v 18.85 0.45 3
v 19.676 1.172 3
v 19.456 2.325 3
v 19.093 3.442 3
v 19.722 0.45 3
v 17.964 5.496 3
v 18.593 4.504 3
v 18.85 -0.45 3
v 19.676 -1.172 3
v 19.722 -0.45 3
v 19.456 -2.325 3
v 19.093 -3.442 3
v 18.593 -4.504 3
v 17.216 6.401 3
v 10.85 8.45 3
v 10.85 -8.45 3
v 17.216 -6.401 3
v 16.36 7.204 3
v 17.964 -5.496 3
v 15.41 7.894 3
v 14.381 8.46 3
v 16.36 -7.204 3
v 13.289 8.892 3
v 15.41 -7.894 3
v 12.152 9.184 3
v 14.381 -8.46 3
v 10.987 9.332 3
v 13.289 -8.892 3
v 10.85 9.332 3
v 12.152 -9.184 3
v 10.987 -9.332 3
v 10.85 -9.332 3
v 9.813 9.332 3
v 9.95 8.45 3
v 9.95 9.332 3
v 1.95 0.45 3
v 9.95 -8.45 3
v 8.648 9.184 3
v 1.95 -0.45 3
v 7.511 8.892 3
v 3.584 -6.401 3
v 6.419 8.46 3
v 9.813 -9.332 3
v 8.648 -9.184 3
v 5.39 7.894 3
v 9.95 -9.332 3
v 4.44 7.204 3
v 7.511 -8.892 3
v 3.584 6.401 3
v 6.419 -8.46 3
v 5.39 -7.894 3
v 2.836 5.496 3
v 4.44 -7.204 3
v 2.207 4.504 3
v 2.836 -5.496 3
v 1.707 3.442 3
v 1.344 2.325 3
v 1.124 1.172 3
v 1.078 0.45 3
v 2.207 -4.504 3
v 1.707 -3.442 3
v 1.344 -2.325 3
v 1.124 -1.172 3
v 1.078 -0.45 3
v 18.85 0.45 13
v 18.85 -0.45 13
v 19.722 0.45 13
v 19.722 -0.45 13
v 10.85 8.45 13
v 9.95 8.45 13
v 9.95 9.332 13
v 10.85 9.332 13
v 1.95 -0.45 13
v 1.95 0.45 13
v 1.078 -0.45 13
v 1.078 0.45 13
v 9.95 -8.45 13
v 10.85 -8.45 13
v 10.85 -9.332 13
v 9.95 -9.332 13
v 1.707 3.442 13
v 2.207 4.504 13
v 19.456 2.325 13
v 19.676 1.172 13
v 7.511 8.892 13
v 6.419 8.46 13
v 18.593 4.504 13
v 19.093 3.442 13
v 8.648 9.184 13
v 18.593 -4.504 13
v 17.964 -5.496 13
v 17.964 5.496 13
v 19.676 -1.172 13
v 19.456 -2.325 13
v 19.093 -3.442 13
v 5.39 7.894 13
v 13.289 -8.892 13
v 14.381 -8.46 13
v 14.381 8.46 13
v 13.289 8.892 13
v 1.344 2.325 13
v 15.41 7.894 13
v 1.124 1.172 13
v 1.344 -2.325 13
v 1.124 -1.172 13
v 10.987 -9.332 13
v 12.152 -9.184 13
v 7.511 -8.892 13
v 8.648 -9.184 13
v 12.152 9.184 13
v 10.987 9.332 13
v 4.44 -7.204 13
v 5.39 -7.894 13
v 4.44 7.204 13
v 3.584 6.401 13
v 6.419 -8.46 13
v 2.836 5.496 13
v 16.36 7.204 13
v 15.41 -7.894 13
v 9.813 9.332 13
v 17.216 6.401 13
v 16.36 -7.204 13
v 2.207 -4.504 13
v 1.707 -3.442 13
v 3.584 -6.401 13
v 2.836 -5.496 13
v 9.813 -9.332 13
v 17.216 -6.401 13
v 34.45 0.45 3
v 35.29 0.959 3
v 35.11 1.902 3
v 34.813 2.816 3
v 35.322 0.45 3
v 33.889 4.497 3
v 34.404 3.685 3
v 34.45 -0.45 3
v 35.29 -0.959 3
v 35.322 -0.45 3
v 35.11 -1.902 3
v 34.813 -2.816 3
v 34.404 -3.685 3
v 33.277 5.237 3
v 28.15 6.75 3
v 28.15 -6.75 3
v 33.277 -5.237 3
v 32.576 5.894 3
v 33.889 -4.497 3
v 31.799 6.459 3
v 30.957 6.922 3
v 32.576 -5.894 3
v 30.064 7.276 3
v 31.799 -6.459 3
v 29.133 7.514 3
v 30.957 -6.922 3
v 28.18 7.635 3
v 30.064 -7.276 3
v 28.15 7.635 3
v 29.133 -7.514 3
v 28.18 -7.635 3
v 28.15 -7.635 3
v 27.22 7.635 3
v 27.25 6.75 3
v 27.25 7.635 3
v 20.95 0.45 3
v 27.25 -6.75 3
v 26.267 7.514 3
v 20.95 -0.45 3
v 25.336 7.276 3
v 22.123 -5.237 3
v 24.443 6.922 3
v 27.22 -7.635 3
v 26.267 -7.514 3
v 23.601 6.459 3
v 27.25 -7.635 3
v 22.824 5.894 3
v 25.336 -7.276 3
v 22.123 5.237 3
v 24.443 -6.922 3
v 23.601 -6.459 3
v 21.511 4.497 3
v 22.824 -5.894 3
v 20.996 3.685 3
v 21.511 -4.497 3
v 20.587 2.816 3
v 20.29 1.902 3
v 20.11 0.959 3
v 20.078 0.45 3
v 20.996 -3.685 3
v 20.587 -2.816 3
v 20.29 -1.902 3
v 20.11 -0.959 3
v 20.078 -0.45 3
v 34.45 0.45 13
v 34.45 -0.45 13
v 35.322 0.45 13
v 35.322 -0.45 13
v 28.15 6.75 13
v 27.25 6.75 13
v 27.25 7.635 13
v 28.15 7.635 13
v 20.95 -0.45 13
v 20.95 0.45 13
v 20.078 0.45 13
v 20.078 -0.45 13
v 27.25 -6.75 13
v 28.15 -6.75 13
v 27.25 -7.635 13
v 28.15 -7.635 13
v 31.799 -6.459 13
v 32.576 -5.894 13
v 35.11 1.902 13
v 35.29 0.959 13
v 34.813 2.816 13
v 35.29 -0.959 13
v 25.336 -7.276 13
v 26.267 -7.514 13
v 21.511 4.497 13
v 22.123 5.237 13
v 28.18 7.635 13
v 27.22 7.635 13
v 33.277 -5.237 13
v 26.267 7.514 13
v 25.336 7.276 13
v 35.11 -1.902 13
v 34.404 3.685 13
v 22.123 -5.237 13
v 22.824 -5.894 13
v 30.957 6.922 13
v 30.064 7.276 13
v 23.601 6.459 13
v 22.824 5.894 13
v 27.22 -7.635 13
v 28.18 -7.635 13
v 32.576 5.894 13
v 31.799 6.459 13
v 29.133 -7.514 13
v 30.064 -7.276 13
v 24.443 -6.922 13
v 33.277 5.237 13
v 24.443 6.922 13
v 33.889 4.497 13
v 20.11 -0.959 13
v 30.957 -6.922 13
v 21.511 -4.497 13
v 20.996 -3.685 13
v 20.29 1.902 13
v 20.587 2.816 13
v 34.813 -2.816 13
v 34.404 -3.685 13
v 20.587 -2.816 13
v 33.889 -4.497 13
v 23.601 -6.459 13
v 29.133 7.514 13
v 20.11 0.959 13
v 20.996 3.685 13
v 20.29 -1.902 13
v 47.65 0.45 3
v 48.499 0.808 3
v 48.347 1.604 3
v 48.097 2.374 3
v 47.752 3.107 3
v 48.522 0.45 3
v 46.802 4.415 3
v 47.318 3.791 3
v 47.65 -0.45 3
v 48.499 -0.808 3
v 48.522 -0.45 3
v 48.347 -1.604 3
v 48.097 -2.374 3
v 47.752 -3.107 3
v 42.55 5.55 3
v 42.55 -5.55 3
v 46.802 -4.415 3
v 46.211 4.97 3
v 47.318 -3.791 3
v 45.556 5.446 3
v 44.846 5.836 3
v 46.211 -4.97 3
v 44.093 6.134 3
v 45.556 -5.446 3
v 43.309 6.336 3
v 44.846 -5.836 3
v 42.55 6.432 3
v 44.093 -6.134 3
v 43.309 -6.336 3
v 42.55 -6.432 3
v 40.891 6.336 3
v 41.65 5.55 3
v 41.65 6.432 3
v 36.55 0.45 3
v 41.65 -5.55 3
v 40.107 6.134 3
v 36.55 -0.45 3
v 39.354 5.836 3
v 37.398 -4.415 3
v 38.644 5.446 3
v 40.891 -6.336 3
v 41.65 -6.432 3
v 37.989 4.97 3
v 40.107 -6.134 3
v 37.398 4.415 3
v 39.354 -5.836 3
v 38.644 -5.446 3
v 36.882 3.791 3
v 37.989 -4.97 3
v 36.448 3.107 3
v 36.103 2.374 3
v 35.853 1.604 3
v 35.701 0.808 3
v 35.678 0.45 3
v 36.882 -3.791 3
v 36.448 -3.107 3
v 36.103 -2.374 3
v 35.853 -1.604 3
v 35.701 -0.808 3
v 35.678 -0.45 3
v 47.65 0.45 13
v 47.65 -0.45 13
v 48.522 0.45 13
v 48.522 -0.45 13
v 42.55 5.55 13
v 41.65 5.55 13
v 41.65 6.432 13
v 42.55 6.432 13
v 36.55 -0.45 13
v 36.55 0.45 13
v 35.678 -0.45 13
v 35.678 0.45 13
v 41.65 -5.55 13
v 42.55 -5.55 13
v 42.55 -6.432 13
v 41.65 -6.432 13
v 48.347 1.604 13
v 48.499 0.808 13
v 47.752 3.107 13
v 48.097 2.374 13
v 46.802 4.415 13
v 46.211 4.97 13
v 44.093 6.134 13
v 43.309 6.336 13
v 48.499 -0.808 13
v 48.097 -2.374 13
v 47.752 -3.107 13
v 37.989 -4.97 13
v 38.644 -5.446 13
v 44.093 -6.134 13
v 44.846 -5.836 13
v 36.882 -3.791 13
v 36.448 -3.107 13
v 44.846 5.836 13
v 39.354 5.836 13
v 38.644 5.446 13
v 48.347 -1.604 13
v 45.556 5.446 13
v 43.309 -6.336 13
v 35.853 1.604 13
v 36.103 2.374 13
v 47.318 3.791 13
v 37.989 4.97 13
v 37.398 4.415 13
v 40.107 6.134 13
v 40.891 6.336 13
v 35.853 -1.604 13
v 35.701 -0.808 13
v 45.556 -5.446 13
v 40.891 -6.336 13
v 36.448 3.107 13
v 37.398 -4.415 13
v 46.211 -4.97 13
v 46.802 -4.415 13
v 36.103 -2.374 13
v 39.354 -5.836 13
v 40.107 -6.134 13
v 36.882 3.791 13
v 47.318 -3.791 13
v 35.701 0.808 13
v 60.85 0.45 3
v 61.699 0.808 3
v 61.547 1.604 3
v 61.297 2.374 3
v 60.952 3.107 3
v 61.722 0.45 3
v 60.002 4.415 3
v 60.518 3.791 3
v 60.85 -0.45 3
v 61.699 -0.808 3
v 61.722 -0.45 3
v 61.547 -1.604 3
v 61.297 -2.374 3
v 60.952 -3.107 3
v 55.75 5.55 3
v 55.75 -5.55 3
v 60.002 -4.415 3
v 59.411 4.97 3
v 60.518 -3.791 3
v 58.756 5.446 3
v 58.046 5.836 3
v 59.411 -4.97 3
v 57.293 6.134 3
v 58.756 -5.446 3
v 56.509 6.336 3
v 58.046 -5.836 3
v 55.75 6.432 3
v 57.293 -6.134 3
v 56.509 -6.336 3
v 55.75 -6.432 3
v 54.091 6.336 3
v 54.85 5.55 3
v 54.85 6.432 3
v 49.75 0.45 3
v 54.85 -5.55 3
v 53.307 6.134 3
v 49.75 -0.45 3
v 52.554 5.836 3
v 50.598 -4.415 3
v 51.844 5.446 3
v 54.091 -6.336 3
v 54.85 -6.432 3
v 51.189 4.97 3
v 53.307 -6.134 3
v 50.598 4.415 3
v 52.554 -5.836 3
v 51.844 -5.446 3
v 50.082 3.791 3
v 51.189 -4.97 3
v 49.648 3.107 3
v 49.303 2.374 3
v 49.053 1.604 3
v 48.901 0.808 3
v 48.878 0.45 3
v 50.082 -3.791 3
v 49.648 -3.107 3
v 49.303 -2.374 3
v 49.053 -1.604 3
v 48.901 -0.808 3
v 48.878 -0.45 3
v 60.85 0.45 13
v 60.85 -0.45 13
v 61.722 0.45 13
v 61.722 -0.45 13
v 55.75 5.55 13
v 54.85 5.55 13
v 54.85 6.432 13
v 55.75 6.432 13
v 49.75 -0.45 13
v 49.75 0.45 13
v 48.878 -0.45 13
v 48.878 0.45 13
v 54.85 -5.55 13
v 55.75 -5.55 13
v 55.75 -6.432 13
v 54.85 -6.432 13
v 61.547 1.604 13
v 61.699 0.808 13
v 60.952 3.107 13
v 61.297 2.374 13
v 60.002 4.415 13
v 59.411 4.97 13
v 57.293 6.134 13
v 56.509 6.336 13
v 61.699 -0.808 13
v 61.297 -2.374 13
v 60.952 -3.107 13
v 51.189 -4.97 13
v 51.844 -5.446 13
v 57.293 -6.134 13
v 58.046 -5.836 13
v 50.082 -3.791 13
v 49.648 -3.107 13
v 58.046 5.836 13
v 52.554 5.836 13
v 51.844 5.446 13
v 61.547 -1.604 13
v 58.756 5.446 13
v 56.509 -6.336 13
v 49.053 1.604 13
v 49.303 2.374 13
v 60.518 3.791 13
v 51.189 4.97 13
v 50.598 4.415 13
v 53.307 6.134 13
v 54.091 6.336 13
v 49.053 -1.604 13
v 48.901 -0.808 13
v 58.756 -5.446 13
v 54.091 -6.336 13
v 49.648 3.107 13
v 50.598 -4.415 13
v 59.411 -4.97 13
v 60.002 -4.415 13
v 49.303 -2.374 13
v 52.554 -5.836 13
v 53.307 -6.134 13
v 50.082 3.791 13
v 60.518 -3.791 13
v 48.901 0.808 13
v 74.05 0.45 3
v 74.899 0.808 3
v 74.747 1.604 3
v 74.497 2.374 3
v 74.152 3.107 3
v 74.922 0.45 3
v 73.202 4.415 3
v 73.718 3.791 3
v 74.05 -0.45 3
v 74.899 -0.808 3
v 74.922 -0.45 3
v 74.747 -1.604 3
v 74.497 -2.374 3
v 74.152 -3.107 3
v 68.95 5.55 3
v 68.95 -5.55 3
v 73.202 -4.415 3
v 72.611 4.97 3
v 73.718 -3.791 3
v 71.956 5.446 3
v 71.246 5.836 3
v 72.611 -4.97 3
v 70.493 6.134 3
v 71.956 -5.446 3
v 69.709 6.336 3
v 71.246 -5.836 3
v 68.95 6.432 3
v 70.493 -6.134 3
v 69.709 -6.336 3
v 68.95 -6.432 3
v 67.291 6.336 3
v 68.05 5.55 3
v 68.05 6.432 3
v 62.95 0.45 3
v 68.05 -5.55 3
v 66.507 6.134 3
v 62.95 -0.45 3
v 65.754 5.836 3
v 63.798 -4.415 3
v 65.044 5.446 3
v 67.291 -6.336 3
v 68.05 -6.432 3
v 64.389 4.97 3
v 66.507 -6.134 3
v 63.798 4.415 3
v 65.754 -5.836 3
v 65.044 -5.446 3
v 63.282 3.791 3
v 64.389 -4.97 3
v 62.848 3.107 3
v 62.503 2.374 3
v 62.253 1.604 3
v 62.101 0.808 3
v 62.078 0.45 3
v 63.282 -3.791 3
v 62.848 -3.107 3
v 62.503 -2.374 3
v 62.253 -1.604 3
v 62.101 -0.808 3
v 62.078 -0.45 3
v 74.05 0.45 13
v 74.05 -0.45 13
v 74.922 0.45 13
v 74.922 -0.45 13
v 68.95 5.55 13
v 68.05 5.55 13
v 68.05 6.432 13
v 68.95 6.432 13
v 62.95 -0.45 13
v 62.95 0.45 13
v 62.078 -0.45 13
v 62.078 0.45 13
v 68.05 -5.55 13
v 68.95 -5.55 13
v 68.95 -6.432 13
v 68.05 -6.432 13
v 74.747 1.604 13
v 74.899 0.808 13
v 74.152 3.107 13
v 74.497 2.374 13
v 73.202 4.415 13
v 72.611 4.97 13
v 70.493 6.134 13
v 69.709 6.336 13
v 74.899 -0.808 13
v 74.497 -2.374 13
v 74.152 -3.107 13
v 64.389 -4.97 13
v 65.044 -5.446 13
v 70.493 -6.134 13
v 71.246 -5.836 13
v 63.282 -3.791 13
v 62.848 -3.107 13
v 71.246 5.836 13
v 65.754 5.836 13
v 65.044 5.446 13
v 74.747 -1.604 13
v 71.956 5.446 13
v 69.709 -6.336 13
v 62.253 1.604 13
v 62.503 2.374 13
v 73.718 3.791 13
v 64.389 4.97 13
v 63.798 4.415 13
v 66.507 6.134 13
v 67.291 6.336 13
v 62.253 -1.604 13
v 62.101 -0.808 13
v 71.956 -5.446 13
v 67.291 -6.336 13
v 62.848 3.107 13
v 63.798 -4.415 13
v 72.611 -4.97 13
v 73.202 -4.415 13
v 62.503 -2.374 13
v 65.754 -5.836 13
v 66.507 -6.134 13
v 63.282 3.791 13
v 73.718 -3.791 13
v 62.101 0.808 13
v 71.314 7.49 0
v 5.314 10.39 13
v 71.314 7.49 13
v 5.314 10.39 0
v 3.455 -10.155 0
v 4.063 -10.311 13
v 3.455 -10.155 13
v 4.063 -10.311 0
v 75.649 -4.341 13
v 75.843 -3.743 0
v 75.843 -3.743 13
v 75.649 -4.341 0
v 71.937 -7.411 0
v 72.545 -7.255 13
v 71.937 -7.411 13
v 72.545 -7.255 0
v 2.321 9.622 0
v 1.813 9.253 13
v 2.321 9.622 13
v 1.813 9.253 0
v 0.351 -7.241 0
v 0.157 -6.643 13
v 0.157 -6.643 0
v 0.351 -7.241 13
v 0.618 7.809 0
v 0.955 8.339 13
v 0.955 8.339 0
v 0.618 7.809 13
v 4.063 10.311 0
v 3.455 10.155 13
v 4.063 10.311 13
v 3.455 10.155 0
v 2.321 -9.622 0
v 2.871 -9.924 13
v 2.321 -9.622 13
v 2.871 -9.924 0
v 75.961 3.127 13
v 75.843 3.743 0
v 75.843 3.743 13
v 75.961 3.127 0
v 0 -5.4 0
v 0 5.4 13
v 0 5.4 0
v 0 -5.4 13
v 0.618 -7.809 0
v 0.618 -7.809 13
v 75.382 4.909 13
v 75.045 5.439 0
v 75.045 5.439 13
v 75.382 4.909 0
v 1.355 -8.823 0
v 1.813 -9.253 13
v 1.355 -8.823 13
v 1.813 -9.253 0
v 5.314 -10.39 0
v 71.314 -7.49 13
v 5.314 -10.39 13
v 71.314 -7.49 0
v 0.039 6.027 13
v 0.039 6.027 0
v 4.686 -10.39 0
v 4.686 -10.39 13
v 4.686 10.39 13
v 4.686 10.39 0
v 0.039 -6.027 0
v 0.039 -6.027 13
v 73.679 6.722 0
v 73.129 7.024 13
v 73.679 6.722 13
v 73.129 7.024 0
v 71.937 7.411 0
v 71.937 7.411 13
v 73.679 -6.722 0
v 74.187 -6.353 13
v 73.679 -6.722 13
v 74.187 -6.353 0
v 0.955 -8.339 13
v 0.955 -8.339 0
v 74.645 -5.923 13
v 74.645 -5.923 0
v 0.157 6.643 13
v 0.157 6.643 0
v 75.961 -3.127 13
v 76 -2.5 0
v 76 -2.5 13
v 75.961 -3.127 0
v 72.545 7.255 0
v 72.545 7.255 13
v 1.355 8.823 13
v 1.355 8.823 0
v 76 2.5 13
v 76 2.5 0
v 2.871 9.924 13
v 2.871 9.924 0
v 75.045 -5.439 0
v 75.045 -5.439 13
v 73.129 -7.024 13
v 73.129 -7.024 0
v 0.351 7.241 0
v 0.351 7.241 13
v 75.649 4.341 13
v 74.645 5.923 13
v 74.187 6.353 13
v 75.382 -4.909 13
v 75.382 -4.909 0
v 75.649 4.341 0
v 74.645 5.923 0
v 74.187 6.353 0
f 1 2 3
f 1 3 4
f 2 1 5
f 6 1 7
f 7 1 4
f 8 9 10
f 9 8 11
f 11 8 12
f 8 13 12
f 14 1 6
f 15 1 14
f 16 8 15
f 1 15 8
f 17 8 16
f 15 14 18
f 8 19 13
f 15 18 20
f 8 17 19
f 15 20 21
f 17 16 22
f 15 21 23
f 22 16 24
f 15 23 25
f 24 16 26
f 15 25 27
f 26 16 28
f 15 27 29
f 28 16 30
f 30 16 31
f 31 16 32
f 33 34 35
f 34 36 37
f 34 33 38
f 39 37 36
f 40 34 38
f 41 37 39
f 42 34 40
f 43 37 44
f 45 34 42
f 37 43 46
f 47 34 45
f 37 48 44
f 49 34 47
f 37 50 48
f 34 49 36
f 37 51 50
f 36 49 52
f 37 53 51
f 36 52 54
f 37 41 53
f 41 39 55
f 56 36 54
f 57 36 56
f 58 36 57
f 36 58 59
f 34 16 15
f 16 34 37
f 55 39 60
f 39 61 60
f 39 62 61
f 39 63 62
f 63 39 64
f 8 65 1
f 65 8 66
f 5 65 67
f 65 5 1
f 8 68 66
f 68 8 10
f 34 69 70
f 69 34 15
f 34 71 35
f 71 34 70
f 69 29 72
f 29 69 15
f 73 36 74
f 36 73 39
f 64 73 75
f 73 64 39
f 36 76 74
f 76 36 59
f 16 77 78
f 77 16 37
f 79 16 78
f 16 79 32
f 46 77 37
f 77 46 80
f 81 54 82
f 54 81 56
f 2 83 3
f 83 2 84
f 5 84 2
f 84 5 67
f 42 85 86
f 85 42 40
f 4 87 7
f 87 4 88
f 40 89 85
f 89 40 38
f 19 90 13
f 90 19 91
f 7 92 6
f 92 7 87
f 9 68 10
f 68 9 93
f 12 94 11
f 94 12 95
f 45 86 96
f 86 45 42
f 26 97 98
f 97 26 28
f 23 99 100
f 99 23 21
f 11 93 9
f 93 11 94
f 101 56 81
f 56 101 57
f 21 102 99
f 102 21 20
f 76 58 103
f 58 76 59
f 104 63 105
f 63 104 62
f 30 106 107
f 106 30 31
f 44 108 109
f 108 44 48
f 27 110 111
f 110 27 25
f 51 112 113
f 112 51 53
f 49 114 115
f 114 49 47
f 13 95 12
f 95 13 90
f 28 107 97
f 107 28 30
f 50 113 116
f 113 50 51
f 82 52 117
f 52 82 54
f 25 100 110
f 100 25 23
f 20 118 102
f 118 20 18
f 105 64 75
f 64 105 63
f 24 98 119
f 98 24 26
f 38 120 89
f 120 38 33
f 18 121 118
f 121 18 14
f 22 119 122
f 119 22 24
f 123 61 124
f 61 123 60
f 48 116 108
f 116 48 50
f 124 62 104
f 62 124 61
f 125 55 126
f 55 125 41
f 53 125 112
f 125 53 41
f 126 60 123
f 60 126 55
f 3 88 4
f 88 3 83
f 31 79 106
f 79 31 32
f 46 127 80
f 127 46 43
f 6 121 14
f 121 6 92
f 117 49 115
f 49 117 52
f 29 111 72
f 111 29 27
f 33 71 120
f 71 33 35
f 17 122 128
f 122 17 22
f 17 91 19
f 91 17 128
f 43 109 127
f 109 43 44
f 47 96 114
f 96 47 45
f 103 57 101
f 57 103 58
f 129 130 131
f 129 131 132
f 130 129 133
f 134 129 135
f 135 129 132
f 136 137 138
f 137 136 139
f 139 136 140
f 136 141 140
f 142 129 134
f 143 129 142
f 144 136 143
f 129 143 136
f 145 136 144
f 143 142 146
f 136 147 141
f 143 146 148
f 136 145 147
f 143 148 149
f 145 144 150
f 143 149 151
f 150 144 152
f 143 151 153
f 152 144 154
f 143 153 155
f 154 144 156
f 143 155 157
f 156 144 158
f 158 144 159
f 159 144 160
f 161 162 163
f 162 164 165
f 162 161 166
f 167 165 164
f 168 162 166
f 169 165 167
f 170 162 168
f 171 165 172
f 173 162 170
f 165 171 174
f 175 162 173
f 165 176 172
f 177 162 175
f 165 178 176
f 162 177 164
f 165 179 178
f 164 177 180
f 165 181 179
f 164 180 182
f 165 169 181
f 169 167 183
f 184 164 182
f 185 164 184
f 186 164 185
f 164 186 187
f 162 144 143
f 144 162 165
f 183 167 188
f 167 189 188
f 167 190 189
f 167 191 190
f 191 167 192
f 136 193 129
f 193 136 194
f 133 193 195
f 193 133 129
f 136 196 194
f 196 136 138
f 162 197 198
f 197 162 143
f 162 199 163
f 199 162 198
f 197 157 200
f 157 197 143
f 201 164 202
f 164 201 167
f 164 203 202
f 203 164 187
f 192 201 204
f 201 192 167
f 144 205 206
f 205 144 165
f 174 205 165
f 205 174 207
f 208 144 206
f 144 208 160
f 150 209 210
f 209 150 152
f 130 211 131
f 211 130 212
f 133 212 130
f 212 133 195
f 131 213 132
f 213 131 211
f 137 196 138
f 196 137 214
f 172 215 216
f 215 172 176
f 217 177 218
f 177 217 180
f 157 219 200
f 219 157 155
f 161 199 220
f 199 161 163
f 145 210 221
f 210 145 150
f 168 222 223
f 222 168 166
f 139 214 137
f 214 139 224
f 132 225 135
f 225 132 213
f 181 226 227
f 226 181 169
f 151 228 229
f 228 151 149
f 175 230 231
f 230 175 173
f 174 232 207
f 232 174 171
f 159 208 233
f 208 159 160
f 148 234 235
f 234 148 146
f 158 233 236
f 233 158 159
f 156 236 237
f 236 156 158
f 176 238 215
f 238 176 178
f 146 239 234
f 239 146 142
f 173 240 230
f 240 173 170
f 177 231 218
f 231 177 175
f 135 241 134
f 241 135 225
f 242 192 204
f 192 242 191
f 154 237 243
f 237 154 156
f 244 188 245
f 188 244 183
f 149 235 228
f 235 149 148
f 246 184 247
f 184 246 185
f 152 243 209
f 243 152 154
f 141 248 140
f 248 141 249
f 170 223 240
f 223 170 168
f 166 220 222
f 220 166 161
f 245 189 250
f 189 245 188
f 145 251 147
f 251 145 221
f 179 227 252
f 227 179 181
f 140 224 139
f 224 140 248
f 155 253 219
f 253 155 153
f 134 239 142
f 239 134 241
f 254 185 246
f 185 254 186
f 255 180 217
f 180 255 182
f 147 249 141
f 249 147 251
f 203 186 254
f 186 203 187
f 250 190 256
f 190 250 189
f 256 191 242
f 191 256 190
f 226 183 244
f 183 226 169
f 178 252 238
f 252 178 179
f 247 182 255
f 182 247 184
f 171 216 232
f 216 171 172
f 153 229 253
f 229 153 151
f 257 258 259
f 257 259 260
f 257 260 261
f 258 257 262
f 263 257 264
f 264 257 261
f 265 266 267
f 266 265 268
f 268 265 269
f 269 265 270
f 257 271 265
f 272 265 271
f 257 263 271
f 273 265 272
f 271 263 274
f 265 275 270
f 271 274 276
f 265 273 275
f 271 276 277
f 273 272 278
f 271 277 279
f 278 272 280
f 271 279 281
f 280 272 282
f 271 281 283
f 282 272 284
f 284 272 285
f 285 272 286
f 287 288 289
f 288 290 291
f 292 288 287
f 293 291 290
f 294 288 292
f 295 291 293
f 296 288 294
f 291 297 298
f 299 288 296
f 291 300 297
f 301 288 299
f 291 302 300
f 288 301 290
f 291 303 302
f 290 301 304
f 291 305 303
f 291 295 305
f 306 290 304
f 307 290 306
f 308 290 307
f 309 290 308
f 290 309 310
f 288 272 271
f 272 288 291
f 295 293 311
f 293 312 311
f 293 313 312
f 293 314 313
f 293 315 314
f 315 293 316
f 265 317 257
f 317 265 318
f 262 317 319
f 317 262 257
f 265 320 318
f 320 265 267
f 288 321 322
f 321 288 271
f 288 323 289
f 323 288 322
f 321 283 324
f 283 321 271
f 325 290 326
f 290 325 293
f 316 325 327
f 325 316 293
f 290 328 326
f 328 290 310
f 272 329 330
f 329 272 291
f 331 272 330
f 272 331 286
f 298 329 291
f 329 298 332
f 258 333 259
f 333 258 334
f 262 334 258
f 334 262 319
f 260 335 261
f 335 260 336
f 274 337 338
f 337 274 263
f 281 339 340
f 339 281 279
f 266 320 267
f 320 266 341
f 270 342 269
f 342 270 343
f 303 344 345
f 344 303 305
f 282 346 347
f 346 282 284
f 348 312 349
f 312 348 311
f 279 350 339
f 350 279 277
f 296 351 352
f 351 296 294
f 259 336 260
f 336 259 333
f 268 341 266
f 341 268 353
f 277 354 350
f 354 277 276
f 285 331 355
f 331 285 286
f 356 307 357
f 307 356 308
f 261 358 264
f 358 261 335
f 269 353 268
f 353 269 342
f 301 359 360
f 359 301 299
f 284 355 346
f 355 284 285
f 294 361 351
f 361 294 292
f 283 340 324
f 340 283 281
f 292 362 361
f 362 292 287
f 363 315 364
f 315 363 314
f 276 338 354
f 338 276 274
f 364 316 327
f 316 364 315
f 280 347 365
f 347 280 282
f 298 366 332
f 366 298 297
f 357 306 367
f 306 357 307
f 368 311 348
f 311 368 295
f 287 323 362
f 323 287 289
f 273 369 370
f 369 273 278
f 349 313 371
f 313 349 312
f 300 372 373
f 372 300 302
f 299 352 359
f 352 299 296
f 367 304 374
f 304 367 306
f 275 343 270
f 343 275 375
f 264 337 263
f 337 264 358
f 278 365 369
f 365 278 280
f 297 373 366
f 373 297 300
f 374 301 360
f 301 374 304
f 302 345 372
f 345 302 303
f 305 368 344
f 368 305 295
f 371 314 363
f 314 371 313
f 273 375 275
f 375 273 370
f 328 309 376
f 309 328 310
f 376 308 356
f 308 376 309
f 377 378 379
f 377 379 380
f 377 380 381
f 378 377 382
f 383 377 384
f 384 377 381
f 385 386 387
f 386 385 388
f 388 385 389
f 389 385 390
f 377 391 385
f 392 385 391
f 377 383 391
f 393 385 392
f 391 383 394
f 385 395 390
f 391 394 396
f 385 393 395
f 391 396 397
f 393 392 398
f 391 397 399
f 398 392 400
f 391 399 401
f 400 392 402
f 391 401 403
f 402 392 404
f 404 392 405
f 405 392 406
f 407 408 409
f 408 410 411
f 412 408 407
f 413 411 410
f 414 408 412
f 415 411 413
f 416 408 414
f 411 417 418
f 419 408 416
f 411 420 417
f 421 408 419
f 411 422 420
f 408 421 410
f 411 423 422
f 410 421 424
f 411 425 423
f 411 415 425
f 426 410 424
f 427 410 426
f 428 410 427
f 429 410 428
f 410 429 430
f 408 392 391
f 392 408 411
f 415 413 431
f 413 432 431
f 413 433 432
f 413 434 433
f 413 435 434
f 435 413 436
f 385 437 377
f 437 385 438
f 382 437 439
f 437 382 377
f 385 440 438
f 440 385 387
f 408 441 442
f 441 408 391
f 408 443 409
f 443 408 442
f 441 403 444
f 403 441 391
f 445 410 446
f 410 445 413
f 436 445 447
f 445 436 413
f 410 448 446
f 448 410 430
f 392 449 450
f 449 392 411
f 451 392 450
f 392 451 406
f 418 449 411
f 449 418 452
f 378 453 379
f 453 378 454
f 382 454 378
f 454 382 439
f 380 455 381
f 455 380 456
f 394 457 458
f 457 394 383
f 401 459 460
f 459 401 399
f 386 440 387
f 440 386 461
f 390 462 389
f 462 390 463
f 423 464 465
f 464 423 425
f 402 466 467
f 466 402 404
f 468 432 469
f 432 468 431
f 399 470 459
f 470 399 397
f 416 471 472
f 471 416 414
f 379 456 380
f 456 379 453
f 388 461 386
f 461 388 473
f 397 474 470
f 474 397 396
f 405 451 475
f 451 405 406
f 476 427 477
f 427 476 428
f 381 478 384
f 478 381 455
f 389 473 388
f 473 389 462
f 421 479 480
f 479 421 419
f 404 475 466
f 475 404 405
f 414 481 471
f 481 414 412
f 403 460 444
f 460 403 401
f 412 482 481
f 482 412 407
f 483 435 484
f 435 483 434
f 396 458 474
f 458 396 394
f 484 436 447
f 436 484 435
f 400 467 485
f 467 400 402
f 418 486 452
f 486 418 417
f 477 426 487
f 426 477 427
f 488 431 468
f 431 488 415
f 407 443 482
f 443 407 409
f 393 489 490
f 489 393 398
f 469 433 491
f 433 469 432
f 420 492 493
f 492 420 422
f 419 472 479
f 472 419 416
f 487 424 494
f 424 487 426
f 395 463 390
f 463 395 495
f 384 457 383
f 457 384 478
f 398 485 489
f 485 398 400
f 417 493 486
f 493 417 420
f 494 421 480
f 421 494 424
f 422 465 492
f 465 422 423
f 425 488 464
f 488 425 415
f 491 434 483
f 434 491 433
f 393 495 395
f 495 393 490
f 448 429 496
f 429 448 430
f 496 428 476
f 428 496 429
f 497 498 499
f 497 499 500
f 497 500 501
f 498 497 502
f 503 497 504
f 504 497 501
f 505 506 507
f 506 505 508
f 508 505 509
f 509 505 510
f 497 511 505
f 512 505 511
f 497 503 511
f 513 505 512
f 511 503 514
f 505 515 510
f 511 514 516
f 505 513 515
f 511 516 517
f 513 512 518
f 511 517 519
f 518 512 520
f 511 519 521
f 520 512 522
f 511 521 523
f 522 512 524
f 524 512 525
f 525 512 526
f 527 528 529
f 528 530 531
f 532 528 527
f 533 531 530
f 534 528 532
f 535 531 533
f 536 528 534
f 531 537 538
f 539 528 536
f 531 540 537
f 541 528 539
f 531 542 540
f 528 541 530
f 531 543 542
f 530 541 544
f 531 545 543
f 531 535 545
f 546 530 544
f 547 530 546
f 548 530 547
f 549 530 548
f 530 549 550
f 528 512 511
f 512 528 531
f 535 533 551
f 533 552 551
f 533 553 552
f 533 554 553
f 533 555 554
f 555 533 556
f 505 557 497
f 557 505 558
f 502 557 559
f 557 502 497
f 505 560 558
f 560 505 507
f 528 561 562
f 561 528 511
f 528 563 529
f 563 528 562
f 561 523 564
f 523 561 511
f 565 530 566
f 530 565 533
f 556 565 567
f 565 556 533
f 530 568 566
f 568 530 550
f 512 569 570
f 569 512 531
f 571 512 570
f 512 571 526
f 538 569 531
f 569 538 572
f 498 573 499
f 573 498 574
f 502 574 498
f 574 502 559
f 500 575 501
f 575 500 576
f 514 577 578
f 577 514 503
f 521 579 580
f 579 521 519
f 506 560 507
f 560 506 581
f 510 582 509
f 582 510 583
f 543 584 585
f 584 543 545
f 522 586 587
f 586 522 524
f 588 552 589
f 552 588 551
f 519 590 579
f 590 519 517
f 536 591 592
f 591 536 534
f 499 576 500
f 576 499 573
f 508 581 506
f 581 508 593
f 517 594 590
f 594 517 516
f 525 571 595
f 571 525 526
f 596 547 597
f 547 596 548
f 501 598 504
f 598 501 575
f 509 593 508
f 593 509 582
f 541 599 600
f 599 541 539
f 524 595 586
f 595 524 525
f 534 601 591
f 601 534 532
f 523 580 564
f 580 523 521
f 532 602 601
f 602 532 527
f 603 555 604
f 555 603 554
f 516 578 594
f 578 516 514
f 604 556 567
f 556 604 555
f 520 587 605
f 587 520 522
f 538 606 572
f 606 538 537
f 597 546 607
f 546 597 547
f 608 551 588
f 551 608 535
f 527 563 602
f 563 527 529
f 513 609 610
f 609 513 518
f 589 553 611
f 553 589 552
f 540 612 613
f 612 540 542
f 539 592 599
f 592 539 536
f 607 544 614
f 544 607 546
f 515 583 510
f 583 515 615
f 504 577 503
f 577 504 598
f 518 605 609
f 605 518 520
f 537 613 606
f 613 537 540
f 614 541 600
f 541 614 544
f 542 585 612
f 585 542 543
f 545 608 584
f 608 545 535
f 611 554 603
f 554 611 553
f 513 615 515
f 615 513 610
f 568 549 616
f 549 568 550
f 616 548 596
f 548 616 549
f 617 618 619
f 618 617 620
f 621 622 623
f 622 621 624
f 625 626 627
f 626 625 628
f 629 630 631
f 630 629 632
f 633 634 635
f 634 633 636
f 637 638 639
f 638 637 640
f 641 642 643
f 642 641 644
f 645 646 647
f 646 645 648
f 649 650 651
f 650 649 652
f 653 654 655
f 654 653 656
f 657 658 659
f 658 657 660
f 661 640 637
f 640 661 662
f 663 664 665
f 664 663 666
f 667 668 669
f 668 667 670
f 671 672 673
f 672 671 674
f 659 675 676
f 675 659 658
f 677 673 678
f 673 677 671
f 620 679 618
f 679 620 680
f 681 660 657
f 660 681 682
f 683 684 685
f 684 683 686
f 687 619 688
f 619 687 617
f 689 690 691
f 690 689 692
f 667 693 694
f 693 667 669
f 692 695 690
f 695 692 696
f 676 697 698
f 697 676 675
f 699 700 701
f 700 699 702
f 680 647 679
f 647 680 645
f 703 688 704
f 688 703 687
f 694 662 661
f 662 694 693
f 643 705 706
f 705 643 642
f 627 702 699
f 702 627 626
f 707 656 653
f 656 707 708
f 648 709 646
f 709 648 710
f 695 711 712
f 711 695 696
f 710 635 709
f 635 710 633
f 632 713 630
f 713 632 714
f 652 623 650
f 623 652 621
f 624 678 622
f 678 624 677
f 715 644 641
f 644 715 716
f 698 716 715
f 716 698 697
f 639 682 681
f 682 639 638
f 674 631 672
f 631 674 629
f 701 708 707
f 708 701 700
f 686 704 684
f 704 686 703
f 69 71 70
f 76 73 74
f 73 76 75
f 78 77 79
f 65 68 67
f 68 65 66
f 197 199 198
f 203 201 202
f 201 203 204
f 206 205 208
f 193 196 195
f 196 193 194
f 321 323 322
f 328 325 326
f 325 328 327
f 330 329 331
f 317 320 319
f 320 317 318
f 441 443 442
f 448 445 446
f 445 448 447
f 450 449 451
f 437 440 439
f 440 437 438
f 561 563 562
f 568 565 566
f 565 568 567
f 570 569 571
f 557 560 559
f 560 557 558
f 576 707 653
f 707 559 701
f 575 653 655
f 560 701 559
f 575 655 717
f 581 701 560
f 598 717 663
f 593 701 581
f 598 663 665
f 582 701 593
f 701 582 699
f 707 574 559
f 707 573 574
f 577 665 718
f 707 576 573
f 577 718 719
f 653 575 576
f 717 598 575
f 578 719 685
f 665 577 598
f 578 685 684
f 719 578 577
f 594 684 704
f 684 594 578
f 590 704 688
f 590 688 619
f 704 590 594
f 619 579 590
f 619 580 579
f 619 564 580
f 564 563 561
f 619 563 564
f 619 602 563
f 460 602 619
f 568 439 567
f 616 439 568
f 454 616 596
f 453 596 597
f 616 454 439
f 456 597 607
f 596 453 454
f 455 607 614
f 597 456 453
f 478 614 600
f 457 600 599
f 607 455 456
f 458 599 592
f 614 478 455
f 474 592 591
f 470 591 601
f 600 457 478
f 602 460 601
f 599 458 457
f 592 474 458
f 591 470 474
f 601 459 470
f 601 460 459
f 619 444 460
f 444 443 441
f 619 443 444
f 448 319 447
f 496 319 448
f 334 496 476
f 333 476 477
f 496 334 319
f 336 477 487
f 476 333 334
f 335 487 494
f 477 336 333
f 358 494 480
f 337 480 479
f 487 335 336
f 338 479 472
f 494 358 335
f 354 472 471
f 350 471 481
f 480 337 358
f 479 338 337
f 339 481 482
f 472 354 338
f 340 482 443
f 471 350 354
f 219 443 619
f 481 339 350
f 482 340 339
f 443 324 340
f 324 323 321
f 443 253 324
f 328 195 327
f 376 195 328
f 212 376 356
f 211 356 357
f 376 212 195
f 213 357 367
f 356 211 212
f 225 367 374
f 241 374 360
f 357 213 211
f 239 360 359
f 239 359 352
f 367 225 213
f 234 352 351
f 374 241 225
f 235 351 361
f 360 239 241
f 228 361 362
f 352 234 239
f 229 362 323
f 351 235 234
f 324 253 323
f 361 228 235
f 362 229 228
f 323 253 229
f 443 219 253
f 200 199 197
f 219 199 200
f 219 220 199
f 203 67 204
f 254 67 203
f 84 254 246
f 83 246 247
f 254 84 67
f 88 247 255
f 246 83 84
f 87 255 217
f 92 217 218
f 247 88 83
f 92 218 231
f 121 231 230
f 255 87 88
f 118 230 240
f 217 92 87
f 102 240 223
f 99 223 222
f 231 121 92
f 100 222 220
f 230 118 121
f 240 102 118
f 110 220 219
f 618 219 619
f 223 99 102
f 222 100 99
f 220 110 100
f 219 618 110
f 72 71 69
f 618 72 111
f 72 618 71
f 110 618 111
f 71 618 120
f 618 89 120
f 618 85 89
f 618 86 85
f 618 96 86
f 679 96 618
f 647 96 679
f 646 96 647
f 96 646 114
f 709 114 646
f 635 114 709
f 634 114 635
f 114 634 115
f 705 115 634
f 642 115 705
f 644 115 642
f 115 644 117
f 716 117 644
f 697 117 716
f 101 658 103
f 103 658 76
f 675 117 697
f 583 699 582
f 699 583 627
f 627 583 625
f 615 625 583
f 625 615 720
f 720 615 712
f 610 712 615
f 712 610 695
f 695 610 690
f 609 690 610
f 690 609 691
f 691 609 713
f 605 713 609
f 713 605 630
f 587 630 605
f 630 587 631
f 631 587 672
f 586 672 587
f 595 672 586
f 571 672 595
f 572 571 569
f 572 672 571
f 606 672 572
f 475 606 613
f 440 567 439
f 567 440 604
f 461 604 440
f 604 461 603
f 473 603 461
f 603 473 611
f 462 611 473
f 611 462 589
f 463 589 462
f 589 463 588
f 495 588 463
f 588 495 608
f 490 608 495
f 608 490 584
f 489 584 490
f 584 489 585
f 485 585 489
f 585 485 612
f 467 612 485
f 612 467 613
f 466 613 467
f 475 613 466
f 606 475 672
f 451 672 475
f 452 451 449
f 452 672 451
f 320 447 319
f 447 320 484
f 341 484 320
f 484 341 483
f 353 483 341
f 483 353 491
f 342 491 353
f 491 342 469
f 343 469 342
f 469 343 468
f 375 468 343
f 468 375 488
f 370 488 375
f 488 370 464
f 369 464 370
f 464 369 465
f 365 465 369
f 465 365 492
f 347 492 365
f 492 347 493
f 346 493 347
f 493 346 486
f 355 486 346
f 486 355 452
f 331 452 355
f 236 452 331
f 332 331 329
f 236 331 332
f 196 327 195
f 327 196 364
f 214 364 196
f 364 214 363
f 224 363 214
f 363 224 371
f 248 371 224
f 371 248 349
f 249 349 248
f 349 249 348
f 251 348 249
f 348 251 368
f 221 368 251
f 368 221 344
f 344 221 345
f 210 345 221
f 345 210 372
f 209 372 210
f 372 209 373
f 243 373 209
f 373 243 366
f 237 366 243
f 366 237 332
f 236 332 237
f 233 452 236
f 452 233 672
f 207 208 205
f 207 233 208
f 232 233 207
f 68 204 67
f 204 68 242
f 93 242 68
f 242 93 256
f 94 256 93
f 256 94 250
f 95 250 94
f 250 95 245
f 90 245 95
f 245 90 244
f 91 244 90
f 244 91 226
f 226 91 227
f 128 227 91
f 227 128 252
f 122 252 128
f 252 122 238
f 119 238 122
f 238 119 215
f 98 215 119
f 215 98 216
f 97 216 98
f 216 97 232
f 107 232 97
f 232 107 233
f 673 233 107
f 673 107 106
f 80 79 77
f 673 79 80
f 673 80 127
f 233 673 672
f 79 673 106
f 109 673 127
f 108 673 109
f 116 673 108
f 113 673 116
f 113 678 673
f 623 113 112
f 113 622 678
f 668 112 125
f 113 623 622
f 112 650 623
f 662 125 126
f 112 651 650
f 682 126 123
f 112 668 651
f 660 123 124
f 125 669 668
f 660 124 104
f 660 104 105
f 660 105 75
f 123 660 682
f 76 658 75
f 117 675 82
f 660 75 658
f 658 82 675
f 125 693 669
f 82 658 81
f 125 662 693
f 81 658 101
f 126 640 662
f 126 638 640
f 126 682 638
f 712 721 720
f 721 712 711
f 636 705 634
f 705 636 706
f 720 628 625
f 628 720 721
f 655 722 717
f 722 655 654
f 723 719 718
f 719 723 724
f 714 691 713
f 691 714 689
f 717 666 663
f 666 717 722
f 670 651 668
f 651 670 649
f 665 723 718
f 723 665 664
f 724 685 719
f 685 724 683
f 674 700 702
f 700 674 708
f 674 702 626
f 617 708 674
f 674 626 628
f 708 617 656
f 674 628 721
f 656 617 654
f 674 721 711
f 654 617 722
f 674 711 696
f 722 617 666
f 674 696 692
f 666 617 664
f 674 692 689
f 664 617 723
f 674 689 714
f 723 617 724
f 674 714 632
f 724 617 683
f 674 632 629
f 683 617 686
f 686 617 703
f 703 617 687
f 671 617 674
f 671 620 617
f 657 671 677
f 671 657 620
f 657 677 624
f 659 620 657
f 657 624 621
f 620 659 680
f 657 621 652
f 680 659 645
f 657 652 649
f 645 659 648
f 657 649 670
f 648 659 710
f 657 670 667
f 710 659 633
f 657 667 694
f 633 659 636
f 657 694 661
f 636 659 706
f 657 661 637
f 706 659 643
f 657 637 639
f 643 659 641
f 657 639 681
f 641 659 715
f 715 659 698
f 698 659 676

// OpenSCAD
$fn = 50;
d1 = 17.8;
d2 = 14.4;
d3 = 12;
d4 = 12;
d5 = 12;
tol = 0.3;
socketH=15;
sep = 1.2;
outerWall = 1.5;
dOfs=3*tol;
length = d1 + d2 + d3 +d4 +d5 + 4 * sep + 2*outerWall;

module ridge(d) {
    translate([(d)/2, 0, socketH/2]) { cube([3*tol, 3*tol,socketH], true);}
}
module socketHolder(d) {
    difference() {
    cylinder(d=d+dOfs, h=socketH);
    union() {
        ridge(d=d);
        rotate([0, 0, 90]){ridge(d=d);};
        rotate([0, 0, 180]){ridge(d=d);};
        rotate([0, 0, 270]){ridge(d=d);};
    }
    }
}

module sockets() {
    socketHolder(d1);

    translate([d1/2+ d2/2 + sep,0 ,0]) {
        socketHolder(d2);
    }

    translate([d1/2+ d2 + d3/2 + 2*sep,0 ,0]) {
        socketHolder(d3);
    }

    translate([d1/2+ d2 + d3 + d4/2 + 3*sep,0 ,0]) {
        socketHolder(d4);
    }

    translate([d1/2+ d2 + d3 + d4 + d5/2 + 4*sep,0 ,0]) {
        socketHolder(d5);
    }
}

module baseBody(w1, w2, l, h, r) {
hull() {
translate([r, -w1/2 + r,0]) {cylinder(r=r, h=h);};
translate([r, w1/2 - r,0]) {cylinder(r=r, h=h);};
translate([l - r, -w2/2 + r,0]) {cylinder(r=r, h=h);};
translate([l - r, w2/2 - r,0]) {cylinder(r=r, h=h);};
}
}

difference() {
baseBody(d1+ 2*outerWall, 15, length, 13, 5);
translate([d1/2+outerWall, 0, 3]) {sockets();}
}
